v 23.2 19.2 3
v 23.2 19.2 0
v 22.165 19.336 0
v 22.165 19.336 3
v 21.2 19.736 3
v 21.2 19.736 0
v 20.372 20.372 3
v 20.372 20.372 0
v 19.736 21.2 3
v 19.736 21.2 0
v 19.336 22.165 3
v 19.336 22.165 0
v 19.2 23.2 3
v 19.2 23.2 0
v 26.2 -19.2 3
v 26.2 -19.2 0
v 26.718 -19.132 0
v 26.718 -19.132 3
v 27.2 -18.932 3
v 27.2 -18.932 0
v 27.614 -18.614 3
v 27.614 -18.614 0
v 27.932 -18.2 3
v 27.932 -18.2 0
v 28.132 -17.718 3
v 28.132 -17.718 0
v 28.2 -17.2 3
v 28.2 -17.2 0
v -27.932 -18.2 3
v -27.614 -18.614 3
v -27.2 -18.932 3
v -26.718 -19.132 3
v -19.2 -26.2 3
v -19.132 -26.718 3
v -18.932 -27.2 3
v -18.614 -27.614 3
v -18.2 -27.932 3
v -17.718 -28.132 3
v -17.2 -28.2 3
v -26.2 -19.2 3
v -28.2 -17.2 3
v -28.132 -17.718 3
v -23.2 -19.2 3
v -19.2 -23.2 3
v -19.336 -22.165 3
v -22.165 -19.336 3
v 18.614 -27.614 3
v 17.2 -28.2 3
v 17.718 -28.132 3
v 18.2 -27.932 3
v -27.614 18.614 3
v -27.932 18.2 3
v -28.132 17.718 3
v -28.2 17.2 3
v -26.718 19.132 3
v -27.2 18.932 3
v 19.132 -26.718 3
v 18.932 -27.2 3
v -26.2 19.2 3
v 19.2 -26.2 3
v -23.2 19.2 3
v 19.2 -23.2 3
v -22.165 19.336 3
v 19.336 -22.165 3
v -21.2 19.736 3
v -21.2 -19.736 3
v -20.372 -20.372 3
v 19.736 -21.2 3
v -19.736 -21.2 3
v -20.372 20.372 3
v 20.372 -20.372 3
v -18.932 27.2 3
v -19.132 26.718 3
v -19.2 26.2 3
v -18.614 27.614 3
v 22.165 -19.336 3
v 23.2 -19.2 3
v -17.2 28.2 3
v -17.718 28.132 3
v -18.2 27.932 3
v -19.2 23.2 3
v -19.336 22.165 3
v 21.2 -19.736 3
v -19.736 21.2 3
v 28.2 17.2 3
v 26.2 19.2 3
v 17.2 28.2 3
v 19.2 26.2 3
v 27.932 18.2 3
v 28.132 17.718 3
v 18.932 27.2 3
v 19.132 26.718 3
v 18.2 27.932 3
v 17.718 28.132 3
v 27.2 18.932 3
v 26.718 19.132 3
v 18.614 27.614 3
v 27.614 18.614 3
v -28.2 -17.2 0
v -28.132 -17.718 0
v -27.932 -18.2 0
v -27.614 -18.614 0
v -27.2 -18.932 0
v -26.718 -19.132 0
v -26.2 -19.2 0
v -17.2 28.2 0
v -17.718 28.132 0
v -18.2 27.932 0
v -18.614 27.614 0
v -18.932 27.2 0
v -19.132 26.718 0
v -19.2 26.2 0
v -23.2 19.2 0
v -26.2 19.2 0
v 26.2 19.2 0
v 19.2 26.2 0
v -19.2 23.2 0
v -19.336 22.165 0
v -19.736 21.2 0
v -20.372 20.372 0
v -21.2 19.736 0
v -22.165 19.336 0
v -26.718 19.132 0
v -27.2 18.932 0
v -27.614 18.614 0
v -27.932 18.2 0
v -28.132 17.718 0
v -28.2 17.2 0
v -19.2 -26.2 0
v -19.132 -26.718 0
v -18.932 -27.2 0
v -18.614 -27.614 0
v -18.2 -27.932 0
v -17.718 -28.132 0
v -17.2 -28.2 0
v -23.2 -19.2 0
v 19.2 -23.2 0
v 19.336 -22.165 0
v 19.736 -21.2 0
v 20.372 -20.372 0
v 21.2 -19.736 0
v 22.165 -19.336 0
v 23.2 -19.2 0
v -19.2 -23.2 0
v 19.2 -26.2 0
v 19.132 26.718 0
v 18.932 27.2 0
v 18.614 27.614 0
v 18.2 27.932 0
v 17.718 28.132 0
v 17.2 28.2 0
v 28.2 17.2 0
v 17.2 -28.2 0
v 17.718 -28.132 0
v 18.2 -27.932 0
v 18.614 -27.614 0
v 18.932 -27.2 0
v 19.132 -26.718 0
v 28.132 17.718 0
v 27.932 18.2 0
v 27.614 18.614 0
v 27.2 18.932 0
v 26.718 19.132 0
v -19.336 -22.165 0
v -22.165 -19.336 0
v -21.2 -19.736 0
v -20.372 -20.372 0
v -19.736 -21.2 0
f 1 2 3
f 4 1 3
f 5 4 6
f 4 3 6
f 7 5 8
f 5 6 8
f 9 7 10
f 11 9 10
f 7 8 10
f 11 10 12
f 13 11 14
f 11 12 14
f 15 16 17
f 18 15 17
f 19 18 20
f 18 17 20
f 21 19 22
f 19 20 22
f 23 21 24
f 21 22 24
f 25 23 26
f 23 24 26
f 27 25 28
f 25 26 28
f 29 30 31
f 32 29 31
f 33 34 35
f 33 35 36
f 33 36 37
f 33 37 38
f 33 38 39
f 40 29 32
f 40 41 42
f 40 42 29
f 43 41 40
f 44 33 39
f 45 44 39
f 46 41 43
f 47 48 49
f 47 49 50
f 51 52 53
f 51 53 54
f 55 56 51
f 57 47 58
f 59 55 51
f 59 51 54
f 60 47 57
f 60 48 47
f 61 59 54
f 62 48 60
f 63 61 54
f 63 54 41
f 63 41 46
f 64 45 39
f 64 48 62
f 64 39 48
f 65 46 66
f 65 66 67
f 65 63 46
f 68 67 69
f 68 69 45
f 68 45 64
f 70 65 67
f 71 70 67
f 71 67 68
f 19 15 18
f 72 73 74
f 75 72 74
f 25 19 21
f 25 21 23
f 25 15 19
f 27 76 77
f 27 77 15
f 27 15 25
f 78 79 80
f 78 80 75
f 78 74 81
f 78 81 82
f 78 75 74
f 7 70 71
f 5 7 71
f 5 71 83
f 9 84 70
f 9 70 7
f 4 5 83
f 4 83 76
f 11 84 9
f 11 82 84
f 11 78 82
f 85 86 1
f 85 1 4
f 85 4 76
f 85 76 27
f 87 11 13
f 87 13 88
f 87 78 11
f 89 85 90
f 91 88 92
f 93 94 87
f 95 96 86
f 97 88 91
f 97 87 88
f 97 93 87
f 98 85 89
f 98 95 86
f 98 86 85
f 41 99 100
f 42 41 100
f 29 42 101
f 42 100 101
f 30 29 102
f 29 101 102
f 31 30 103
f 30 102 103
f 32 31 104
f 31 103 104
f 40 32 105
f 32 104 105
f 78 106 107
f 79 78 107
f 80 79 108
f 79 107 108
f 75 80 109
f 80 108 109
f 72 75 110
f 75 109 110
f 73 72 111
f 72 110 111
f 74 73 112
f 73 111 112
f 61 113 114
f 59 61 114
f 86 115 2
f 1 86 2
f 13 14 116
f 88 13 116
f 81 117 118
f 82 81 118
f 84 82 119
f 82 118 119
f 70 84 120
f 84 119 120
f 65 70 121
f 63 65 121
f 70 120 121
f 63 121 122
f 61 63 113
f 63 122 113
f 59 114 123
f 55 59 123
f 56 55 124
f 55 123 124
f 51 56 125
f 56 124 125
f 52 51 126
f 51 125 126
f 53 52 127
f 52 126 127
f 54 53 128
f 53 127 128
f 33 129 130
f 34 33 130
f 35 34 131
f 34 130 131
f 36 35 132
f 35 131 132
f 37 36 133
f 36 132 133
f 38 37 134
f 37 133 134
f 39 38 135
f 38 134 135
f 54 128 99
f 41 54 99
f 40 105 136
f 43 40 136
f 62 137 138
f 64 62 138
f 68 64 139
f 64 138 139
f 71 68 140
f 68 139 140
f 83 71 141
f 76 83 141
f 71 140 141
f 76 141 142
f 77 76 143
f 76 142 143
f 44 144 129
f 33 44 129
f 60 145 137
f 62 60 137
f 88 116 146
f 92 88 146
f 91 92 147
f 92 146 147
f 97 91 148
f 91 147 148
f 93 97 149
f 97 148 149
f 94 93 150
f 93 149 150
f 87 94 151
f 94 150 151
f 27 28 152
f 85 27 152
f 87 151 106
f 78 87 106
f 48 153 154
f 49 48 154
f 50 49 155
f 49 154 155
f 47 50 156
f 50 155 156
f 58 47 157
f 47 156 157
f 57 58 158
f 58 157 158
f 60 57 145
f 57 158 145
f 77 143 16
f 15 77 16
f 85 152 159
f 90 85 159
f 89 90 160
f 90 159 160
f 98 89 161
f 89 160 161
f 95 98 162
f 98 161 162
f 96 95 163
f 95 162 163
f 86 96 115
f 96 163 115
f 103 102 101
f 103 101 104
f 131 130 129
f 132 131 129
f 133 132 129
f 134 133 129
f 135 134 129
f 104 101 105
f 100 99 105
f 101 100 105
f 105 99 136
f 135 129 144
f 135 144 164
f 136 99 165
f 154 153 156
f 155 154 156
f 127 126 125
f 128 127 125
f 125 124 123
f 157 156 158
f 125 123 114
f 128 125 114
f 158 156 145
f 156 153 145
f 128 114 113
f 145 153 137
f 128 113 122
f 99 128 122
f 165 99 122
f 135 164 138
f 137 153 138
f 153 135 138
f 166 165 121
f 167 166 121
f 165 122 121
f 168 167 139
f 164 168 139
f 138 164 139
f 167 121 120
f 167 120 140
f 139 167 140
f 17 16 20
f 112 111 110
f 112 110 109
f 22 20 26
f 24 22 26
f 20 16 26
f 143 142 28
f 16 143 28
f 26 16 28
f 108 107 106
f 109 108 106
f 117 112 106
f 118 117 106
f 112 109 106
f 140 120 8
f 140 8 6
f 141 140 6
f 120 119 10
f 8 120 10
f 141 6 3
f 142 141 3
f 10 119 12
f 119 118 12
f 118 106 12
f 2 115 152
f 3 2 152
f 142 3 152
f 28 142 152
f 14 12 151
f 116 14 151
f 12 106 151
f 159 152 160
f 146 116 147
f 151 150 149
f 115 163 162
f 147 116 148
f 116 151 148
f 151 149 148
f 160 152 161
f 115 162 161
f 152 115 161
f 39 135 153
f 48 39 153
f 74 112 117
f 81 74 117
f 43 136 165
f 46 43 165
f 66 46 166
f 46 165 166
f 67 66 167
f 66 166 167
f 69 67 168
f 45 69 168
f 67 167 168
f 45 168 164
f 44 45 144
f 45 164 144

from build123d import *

# Parameters (mm, degrees)
EXTRUDE_1_DEPTH = 3


with BuildPart() as part:
    # 草图1 → 凸台-拉伸1 (new body)
    with BuildSketch(Plane.XY):
        with BuildLine():
            Line((28.2, -17.2), (28.2, 17.2))
            ThreePointArc((28.2, 17.2), (27.614213562, 18.614213562), (26.2, 19.2))
            Line((26.2, 19.2), (23.2, 19.2))
            ThreePointArc((23.2, 19.2), (20.371572875, 20.371572875), (19.2, 23.2))
            Line((19.2, 23.2), (19.2, 26.2))
            ThreePointArc((19.2, 26.2), (18.614213562, 27.614213562), (17.2, 28.2))
            Line((17.2, 28.2), (-17.2, 28.2))
            ThreePointArc((-17.2, 28.2), (-18.614213562, 27.614213562), (-19.2, 26.2))
            Line((-19.2, 26.2), (-19.2, 23.2))
            ThreePointArc((-19.2, 23.2), (-20.371572875, 20.371572875), (-23.2, 19.2))
            Line((-23.2, 19.2), (-26.2, 19.2))
            ThreePointArc((-26.2, 19.2), (-27.614213562, 18.614213562), (-28.2, 17.2))
            Line((-28.2, 17.2), (-28.2, -17.2))
            ThreePointArc((-28.2, -17.2), (-27.614213562, -18.614213562), (-26.2, -19.2))
            Line((-26.2, -19.2), (-23.2, -19.2))
            ThreePointArc((-23.2, -19.2), (-20.371572875, -20.371572875), (-19.2, -23.2))
            Line((-19.2, -23.2), (-19.2, -26.2))
            ThreePointArc((-19.2, -26.2), (-18.614213562, -27.614213562), (-17.2, -28.2))
            Line((-17.2, -28.2), (17.2, -28.2))
            ThreePointArc((17.2, -28.2), (18.614213562, -27.614213562), (19.2, -26.2))
            Line((19.2, -26.2), (19.2, -23.2))
            ThreePointArc((19.2, -23.2), (20.371572875, -20.371572875), (23.2, -19.2))
            Line((23.2, -19.2), (26.2, -19.2))
            ThreePointArc((26.2, -19.2), (27.614213562, -18.614213562), (28.2, -17.2))
        make_face()
    extrude(amount=EXTRUDE_1_DEPTH)


solid = part.part
